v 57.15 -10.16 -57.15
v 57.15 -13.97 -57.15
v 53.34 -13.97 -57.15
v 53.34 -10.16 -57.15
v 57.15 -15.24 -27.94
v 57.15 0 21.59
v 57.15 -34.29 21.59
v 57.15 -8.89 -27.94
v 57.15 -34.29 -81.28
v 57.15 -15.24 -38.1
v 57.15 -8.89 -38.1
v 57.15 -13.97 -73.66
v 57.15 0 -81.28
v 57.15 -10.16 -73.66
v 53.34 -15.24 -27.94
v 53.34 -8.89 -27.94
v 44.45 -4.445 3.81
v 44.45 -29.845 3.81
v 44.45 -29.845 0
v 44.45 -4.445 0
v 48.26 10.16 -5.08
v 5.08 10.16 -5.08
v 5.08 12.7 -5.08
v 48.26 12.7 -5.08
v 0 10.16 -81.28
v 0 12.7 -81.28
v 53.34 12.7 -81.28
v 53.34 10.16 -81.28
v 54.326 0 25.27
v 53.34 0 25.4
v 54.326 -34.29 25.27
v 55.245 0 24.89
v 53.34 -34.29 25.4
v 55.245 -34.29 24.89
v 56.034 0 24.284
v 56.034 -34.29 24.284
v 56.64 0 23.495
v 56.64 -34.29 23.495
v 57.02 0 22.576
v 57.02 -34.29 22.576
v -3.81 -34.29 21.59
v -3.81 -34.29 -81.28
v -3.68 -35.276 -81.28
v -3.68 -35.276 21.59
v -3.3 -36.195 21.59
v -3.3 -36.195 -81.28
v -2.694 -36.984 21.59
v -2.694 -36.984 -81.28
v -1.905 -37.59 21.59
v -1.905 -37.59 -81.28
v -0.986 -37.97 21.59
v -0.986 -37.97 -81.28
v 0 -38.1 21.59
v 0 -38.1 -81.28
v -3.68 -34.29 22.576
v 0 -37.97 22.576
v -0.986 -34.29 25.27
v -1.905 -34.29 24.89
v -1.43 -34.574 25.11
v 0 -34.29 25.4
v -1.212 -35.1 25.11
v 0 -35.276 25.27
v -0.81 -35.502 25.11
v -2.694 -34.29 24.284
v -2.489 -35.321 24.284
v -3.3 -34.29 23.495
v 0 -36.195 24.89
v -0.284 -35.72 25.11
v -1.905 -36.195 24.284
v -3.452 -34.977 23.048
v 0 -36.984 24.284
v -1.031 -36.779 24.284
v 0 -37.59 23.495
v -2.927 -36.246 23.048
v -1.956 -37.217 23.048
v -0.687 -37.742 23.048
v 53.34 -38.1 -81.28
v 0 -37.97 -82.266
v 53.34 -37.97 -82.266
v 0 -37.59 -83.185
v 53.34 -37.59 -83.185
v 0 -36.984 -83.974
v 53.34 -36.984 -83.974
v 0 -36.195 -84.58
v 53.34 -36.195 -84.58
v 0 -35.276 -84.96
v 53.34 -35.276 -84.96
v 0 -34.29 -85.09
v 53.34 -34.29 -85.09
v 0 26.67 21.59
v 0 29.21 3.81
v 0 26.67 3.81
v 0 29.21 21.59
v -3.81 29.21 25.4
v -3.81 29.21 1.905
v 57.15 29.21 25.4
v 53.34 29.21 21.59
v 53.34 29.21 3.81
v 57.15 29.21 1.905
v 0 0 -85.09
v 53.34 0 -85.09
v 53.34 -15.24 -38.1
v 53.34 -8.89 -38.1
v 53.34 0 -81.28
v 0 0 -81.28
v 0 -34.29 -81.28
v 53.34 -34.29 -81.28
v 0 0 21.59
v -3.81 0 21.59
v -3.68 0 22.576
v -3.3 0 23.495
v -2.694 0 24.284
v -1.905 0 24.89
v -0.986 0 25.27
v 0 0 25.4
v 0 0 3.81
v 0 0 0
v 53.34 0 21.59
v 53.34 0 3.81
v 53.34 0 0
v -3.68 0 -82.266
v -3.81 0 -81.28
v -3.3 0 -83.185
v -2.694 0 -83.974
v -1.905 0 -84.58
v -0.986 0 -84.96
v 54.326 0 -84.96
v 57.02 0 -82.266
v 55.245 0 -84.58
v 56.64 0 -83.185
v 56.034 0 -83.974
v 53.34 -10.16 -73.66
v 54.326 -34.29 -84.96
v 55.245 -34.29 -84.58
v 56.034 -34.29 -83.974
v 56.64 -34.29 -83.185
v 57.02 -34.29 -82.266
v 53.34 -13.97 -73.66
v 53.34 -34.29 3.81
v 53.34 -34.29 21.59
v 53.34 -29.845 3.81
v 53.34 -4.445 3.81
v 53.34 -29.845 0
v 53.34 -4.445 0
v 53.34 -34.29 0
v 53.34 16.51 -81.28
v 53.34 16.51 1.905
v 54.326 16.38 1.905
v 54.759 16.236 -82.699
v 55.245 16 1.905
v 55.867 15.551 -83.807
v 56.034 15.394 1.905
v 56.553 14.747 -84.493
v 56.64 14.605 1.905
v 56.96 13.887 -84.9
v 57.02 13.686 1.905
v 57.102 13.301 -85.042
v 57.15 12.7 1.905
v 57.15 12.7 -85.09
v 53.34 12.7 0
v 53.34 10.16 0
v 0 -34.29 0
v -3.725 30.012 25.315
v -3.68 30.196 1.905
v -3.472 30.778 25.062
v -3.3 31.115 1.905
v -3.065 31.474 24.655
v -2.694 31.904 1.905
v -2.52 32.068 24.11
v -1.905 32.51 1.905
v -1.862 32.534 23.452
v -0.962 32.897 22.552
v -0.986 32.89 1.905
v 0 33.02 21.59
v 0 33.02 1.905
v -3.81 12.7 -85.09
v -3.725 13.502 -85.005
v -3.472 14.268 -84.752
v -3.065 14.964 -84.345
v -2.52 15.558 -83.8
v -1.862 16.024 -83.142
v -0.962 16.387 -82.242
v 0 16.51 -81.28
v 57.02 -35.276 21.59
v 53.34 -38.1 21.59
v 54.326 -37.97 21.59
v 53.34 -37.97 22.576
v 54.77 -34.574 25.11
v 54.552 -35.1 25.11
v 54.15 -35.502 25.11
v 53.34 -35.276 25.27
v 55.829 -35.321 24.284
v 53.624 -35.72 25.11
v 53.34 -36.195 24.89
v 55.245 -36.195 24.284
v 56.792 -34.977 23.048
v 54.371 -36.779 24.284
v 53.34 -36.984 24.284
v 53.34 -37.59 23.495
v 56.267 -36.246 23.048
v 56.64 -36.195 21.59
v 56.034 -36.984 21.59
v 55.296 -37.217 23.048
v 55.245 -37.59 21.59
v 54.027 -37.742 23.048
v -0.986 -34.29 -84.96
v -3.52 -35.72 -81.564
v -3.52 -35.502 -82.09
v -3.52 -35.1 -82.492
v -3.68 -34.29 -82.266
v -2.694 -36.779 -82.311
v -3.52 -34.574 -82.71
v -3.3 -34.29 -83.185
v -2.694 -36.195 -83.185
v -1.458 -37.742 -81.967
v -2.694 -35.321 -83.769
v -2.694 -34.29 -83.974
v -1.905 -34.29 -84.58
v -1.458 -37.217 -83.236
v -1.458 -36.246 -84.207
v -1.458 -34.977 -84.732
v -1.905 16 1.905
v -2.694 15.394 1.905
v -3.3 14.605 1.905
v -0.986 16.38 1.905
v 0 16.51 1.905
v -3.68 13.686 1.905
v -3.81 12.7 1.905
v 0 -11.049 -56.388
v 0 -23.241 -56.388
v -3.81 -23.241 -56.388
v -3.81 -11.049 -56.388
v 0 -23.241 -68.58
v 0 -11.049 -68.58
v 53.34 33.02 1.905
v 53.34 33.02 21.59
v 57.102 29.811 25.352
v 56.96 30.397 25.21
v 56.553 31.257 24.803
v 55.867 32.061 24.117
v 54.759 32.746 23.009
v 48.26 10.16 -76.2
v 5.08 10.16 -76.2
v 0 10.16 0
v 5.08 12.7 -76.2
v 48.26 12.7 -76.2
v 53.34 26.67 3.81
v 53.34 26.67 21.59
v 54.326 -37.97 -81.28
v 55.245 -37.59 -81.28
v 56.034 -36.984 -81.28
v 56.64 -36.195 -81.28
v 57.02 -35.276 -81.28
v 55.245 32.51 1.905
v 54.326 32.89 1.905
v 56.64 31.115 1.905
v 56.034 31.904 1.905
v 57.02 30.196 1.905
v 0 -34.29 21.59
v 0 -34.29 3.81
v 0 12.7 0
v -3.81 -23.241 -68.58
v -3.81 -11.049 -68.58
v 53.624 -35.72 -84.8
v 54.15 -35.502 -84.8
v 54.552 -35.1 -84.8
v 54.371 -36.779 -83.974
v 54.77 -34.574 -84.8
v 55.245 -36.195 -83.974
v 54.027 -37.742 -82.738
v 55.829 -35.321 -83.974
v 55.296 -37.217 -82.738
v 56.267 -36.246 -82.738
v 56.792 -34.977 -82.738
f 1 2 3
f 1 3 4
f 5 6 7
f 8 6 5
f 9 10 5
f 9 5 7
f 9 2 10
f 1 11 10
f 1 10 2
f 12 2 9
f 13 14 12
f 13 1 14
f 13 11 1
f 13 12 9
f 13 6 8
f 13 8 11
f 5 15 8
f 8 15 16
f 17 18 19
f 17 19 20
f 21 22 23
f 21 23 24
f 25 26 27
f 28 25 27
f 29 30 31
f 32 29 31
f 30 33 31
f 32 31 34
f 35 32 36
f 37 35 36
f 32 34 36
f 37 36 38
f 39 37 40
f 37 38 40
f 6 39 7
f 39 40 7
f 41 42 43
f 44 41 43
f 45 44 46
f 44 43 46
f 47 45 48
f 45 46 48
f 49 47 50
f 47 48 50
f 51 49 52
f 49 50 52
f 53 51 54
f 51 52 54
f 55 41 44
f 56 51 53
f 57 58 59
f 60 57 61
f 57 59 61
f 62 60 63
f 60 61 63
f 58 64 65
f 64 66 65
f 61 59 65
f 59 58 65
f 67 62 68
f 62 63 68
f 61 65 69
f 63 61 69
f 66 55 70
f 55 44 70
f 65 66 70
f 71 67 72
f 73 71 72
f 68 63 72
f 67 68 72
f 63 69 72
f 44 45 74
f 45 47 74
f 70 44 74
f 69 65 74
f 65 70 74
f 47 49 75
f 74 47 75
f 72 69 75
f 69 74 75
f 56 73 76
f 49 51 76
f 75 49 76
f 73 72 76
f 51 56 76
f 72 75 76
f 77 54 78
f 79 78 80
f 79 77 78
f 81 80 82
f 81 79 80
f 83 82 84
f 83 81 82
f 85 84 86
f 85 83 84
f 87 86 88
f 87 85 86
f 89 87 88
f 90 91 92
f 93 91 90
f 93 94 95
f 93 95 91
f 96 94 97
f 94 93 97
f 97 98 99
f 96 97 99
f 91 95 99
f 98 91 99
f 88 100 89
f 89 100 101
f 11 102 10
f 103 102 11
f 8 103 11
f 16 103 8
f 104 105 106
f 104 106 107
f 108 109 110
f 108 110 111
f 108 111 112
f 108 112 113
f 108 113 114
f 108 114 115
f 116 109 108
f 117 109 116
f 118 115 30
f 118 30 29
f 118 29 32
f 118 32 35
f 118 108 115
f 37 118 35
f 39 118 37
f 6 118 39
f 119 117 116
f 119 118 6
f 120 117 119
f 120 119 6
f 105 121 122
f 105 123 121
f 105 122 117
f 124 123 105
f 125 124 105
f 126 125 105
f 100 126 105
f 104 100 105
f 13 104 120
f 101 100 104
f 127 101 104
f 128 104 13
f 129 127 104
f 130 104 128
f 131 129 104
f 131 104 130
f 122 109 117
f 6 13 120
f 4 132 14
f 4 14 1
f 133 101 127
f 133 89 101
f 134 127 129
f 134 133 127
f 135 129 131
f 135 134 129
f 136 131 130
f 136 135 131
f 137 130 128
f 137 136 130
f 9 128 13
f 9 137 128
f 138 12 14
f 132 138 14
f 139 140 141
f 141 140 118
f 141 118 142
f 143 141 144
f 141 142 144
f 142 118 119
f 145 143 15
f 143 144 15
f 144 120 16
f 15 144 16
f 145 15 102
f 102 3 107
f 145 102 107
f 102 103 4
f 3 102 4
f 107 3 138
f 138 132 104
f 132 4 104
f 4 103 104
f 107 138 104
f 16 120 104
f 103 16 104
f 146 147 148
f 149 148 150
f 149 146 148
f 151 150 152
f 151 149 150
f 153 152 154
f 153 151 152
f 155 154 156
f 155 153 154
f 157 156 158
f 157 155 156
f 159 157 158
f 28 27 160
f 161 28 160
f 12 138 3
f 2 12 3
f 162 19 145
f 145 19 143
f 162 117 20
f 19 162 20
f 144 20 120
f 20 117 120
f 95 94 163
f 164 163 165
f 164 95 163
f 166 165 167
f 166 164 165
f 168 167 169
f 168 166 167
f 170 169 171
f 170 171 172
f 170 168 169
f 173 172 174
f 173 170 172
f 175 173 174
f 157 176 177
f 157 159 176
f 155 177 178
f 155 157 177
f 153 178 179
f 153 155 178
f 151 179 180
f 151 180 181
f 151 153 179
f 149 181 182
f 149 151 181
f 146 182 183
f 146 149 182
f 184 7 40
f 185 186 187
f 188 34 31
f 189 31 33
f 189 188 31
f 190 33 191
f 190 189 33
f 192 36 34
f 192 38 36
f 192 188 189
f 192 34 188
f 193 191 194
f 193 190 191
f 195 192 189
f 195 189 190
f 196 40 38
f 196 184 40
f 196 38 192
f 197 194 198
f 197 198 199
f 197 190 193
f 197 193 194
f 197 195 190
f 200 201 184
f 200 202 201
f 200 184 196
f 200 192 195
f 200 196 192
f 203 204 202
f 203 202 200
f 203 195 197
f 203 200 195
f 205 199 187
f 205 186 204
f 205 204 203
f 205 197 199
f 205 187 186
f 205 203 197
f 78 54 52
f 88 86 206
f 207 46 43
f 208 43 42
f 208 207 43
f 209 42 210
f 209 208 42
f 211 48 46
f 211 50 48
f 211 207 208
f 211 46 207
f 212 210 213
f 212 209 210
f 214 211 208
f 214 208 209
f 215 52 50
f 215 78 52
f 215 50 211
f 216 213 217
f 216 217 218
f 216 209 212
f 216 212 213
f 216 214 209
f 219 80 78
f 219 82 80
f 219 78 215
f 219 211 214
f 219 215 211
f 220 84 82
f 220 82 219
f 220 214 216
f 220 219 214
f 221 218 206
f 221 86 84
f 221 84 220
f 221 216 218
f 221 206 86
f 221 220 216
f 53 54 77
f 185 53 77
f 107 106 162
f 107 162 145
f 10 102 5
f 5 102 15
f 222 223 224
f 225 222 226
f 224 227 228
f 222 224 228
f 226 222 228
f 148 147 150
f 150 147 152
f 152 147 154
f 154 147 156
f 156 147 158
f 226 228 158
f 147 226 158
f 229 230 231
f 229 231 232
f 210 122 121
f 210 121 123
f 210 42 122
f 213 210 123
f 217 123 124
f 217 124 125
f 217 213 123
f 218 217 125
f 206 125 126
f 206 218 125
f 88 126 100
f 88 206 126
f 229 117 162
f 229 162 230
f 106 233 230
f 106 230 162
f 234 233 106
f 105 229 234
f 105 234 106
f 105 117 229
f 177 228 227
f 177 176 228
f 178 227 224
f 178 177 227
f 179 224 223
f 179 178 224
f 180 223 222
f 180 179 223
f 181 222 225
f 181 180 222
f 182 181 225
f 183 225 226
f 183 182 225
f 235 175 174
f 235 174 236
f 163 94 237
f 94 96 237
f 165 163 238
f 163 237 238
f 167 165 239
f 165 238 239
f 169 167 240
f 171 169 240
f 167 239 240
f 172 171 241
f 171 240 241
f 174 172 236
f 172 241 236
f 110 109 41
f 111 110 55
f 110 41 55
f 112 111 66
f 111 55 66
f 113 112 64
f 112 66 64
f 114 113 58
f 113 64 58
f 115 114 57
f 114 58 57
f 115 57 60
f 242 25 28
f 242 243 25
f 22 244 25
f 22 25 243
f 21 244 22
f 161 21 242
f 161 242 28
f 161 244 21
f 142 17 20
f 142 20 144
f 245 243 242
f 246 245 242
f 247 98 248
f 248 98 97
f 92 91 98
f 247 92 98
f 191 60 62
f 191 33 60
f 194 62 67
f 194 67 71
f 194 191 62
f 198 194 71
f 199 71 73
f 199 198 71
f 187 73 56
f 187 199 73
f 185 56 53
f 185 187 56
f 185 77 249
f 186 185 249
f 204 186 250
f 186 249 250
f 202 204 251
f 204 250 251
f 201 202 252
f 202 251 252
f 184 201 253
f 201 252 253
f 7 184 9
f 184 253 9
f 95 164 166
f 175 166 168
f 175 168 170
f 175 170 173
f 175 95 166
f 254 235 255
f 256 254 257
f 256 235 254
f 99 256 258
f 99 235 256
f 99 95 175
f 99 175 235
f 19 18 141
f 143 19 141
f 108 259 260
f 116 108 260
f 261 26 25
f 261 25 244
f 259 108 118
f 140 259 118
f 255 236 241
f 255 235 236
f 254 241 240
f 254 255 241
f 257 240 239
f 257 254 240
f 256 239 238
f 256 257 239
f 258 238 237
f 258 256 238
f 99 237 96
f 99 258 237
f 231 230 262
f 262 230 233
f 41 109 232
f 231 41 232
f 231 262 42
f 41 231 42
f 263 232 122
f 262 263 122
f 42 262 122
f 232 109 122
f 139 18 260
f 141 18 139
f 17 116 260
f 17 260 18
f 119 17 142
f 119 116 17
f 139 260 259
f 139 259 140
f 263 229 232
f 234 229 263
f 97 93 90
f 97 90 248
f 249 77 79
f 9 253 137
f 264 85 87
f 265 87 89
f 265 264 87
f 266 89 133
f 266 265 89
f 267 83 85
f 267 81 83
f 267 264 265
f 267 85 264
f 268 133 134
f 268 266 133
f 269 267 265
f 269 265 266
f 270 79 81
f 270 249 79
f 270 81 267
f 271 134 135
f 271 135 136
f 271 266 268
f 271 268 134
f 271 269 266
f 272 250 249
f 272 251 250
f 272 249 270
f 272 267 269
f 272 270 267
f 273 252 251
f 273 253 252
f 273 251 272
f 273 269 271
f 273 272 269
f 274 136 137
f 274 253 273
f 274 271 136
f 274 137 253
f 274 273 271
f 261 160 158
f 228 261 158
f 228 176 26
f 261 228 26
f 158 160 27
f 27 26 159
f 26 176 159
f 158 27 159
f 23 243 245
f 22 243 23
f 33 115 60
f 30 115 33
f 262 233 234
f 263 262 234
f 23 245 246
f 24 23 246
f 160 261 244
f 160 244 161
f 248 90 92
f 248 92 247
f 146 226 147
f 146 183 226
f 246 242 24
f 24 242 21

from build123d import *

# Parameters (mm, degrees)
SKETCH3_W           = 60.96
SKETCH3_H           = 110.49
BOSS_EXTRUDE2_DEPTH = 38.1
SKETCH1_W           = 53.34
SKETCH1_H           = 81.28
SKETCH1_H_2         = 17.78
CUT_EXTRUDE1_DEPTH  = 34.29
SKETCH4_W           = 8.89
SKETCH4_H           = 25.4
CUT_EXTRUDE2_DEPTH  = 3.81
SKETCH5_W           = 10.16
SKETCH5_H           = 6.35
SKETCH5_W_2         = 16.51
SKETCH5_H_2         = 3.81
CUT_EXTRUDE3_DEPTH  = 3.81
SKETCH6_W           = 12.192
SKETCH6_H           = 12.192
CUT_EXTRUDE4_DEPTH  = 3.81
SKETCH8_W           = 60.96
SKETCH8_H           = 86.995
BOSS_EXTRUDE3_DEPTH = 3.81
SKETCH9_W           = 60.96
SKETCH9_H           = 23.495
BOSS_EXTRUDE4_DEPTH = 3.81
SKETCH10_W          = 53.34
SKETCH10_H          = 81.28
BOSS_EXTRUDE5_DEPTH = 2.54
SKETCH11_W          = 53.34
SKETCH11_H          = 17.78
BOSS_EXTRUDE6_DEPTH = 2.54
FILLET1_R           = 3.81
FILLET2_R           = 3.81
FILLET3_R           = 3.81
SKETCH12_W          = 43.18
SKETCH12_H          = 71.12
CUT_EXTRUDE5_DEPTH  = 2.54


with BuildPart() as part:
    # Sketch3 → Boss-Extrude2 (new body)
    with BuildSketch(Plane(origin=(0, 0, 0), x_dir=(1, 0, 0), z_dir=(0, 1, 0))):
        with Locations((26.67, 29.845)):
            Rectangle(SKETCH3_W, SKETCH3_H)
    extrude(amount=-BOSS_EXTRUDE2_DEPTH)

    # Sketch1 → Cut-Extrude1 (cut)
    with BuildSketch(Plane(origin=(0, 0, 0), x_dir=(1, 0, 0), z_dir=(0, 1, 0))):
        with Locations((26.67, 40.64)):
            Rectangle(SKETCH1_W, SKETCH1_H)
        with Locations((26.67, -12.7)):
            Rectangle(SKETCH1_W, SKETCH1_H_2)
    extrude(amount=-CUT_EXTRUDE1_DEPTH, mode=Mode.SUBTRACT)

    # Sketch4 → Cut-Extrude2 (cut)
    with BuildSketch(Plane.XY.offset(3.81)):
        with Locations((48.895, -17.145)):
            Rectangle(SKETCH4_W, SKETCH4_H)
    extrude(amount=-CUT_EXTRUDE2_DEPTH, mode=Mode.SUBTRACT)

    # Sketch5 → Cut-Extrude3 (cut)
    with BuildSketch(Plane.ZY.offset(-53.34)):
        with Locations((-33.02, -12.065)):
            Rectangle(SKETCH5_W, SKETCH5_H)
        with Locations((-65.405, -12.065)):
            Rectangle(SKETCH5_W_2, SKETCH5_H_2)
    extrude(amount=-CUT_EXTRUDE3_DEPTH, mode=Mode.SUBTRACT)

    # Sketch6 → Cut-Extrude4 (cut)
    with BuildSketch(Plane(origin=(0, 0, 0), x_dir=(0, 0, -1), z_dir=(1, 0, 0))):
        with Locations((62.484, -17.145)):
            Rectangle(SKETCH6_W, SKETCH6_H)
    extrude(amount=-CUT_EXTRUDE4_DEPTH, mode=Mode.SUBTRACT)

    # Fillet1
    fillet1_edges = [part.edges().sort_by_distance(p)[0] for p in [
        (57.15, -38.1, -29.845),
        (26.67, -38.1, -85.09),
        (-3.81, -38.1, -29.845),
        (-3.81, -19.05, -85.09),
        (57.15, -19.05, -85.09),
        (57.15, -19.05, 25.4),
        (-3.81, -19.05, 25.4),
        (26.67, -38.1, 25.4),
    ]]
    fillet(fillet1_edges, radius=FILLET1_R)


with BuildPart() as body_2:
    # Sketch8 → Boss-Extrude3 (new body)
    with BuildSketch(Plane(origin=(0, 12.7, 0), x_dir=(1, 0, 0), z_dir=(0, 1, 0))):
        with Locations((26.67, 41.5925)):
            Rectangle(SKETCH8_W, SKETCH8_H)
    extrude(amount=BOSS_EXTRUDE3_DEPTH)

    # Sketch10 → Boss-Extrude5 (add)
    with BuildSketch(Plane.XZ.offset(-12.7)):
        with Locations((26.67, -40.64)):
            Rectangle(SKETCH10_W, SKETCH10_H)
    extrude(amount=BOSS_EXTRUDE5_DEPTH)

    # Fillet2
    fillet2_edges = [body_2.edges().sort_by_distance(p)[0] for p in [
        (57.15, 16.51, -41.5925),
        (26.67, 16.51, -85.09),
        (-3.81, 16.51, -41.5925),
    ]]
    fillet(fillet2_edges, radius=FILLET2_R - 0.0001)  # a hair under: the kernel refuses the full size

    # Sketch12 → Cut-Extrude5 (cut)
    with BuildSketch(Plane.XZ.offset(-10.16)):
        with Locations((26.67, -40.64)):
            Rectangle(SKETCH12_W, SKETCH12_H)
    extrude(amount=-CUT_EXTRUDE5_DEPTH, mode=Mode.SUBTRACT)


with BuildPart() as body_3:
    # Sketch9 → Boss-Extrude4 (new body)
    with BuildSketch(Plane(origin=(0, 29.21, 0), x_dir=(1, 0, 0), z_dir=(0, 1, 0))):
        with Locations((26.67, -13.6525)):
            Rectangle(SKETCH9_W, SKETCH9_H)
    extrude(amount=BOSS_EXTRUDE4_DEPTH)

    # Sketch11 → Boss-Extrude6 (add)
    with BuildSketch(Plane.XZ.offset(-29.21)):
        with Locations((26.67, 12.7)):
            Rectangle(SKETCH11_W, SKETCH11_H)
    extrude(amount=BOSS_EXTRUDE6_DEPTH)

    # Fillet3
    fillet3_edges = [body_3.edges().sort_by_distance(p)[0] for p in [
        (57.15, 33.02, 13.6525),
        (26.67, 33.02, 25.4),
        (-3.81, 33.02, 13.6525),
    ]]
    fillet(fillet3_edges, radius=FILLET3_R - 0.0001)  # a hair under: the kernel refuses the full size


solid = Compound([part.part, body_2.part, body_3.part])
